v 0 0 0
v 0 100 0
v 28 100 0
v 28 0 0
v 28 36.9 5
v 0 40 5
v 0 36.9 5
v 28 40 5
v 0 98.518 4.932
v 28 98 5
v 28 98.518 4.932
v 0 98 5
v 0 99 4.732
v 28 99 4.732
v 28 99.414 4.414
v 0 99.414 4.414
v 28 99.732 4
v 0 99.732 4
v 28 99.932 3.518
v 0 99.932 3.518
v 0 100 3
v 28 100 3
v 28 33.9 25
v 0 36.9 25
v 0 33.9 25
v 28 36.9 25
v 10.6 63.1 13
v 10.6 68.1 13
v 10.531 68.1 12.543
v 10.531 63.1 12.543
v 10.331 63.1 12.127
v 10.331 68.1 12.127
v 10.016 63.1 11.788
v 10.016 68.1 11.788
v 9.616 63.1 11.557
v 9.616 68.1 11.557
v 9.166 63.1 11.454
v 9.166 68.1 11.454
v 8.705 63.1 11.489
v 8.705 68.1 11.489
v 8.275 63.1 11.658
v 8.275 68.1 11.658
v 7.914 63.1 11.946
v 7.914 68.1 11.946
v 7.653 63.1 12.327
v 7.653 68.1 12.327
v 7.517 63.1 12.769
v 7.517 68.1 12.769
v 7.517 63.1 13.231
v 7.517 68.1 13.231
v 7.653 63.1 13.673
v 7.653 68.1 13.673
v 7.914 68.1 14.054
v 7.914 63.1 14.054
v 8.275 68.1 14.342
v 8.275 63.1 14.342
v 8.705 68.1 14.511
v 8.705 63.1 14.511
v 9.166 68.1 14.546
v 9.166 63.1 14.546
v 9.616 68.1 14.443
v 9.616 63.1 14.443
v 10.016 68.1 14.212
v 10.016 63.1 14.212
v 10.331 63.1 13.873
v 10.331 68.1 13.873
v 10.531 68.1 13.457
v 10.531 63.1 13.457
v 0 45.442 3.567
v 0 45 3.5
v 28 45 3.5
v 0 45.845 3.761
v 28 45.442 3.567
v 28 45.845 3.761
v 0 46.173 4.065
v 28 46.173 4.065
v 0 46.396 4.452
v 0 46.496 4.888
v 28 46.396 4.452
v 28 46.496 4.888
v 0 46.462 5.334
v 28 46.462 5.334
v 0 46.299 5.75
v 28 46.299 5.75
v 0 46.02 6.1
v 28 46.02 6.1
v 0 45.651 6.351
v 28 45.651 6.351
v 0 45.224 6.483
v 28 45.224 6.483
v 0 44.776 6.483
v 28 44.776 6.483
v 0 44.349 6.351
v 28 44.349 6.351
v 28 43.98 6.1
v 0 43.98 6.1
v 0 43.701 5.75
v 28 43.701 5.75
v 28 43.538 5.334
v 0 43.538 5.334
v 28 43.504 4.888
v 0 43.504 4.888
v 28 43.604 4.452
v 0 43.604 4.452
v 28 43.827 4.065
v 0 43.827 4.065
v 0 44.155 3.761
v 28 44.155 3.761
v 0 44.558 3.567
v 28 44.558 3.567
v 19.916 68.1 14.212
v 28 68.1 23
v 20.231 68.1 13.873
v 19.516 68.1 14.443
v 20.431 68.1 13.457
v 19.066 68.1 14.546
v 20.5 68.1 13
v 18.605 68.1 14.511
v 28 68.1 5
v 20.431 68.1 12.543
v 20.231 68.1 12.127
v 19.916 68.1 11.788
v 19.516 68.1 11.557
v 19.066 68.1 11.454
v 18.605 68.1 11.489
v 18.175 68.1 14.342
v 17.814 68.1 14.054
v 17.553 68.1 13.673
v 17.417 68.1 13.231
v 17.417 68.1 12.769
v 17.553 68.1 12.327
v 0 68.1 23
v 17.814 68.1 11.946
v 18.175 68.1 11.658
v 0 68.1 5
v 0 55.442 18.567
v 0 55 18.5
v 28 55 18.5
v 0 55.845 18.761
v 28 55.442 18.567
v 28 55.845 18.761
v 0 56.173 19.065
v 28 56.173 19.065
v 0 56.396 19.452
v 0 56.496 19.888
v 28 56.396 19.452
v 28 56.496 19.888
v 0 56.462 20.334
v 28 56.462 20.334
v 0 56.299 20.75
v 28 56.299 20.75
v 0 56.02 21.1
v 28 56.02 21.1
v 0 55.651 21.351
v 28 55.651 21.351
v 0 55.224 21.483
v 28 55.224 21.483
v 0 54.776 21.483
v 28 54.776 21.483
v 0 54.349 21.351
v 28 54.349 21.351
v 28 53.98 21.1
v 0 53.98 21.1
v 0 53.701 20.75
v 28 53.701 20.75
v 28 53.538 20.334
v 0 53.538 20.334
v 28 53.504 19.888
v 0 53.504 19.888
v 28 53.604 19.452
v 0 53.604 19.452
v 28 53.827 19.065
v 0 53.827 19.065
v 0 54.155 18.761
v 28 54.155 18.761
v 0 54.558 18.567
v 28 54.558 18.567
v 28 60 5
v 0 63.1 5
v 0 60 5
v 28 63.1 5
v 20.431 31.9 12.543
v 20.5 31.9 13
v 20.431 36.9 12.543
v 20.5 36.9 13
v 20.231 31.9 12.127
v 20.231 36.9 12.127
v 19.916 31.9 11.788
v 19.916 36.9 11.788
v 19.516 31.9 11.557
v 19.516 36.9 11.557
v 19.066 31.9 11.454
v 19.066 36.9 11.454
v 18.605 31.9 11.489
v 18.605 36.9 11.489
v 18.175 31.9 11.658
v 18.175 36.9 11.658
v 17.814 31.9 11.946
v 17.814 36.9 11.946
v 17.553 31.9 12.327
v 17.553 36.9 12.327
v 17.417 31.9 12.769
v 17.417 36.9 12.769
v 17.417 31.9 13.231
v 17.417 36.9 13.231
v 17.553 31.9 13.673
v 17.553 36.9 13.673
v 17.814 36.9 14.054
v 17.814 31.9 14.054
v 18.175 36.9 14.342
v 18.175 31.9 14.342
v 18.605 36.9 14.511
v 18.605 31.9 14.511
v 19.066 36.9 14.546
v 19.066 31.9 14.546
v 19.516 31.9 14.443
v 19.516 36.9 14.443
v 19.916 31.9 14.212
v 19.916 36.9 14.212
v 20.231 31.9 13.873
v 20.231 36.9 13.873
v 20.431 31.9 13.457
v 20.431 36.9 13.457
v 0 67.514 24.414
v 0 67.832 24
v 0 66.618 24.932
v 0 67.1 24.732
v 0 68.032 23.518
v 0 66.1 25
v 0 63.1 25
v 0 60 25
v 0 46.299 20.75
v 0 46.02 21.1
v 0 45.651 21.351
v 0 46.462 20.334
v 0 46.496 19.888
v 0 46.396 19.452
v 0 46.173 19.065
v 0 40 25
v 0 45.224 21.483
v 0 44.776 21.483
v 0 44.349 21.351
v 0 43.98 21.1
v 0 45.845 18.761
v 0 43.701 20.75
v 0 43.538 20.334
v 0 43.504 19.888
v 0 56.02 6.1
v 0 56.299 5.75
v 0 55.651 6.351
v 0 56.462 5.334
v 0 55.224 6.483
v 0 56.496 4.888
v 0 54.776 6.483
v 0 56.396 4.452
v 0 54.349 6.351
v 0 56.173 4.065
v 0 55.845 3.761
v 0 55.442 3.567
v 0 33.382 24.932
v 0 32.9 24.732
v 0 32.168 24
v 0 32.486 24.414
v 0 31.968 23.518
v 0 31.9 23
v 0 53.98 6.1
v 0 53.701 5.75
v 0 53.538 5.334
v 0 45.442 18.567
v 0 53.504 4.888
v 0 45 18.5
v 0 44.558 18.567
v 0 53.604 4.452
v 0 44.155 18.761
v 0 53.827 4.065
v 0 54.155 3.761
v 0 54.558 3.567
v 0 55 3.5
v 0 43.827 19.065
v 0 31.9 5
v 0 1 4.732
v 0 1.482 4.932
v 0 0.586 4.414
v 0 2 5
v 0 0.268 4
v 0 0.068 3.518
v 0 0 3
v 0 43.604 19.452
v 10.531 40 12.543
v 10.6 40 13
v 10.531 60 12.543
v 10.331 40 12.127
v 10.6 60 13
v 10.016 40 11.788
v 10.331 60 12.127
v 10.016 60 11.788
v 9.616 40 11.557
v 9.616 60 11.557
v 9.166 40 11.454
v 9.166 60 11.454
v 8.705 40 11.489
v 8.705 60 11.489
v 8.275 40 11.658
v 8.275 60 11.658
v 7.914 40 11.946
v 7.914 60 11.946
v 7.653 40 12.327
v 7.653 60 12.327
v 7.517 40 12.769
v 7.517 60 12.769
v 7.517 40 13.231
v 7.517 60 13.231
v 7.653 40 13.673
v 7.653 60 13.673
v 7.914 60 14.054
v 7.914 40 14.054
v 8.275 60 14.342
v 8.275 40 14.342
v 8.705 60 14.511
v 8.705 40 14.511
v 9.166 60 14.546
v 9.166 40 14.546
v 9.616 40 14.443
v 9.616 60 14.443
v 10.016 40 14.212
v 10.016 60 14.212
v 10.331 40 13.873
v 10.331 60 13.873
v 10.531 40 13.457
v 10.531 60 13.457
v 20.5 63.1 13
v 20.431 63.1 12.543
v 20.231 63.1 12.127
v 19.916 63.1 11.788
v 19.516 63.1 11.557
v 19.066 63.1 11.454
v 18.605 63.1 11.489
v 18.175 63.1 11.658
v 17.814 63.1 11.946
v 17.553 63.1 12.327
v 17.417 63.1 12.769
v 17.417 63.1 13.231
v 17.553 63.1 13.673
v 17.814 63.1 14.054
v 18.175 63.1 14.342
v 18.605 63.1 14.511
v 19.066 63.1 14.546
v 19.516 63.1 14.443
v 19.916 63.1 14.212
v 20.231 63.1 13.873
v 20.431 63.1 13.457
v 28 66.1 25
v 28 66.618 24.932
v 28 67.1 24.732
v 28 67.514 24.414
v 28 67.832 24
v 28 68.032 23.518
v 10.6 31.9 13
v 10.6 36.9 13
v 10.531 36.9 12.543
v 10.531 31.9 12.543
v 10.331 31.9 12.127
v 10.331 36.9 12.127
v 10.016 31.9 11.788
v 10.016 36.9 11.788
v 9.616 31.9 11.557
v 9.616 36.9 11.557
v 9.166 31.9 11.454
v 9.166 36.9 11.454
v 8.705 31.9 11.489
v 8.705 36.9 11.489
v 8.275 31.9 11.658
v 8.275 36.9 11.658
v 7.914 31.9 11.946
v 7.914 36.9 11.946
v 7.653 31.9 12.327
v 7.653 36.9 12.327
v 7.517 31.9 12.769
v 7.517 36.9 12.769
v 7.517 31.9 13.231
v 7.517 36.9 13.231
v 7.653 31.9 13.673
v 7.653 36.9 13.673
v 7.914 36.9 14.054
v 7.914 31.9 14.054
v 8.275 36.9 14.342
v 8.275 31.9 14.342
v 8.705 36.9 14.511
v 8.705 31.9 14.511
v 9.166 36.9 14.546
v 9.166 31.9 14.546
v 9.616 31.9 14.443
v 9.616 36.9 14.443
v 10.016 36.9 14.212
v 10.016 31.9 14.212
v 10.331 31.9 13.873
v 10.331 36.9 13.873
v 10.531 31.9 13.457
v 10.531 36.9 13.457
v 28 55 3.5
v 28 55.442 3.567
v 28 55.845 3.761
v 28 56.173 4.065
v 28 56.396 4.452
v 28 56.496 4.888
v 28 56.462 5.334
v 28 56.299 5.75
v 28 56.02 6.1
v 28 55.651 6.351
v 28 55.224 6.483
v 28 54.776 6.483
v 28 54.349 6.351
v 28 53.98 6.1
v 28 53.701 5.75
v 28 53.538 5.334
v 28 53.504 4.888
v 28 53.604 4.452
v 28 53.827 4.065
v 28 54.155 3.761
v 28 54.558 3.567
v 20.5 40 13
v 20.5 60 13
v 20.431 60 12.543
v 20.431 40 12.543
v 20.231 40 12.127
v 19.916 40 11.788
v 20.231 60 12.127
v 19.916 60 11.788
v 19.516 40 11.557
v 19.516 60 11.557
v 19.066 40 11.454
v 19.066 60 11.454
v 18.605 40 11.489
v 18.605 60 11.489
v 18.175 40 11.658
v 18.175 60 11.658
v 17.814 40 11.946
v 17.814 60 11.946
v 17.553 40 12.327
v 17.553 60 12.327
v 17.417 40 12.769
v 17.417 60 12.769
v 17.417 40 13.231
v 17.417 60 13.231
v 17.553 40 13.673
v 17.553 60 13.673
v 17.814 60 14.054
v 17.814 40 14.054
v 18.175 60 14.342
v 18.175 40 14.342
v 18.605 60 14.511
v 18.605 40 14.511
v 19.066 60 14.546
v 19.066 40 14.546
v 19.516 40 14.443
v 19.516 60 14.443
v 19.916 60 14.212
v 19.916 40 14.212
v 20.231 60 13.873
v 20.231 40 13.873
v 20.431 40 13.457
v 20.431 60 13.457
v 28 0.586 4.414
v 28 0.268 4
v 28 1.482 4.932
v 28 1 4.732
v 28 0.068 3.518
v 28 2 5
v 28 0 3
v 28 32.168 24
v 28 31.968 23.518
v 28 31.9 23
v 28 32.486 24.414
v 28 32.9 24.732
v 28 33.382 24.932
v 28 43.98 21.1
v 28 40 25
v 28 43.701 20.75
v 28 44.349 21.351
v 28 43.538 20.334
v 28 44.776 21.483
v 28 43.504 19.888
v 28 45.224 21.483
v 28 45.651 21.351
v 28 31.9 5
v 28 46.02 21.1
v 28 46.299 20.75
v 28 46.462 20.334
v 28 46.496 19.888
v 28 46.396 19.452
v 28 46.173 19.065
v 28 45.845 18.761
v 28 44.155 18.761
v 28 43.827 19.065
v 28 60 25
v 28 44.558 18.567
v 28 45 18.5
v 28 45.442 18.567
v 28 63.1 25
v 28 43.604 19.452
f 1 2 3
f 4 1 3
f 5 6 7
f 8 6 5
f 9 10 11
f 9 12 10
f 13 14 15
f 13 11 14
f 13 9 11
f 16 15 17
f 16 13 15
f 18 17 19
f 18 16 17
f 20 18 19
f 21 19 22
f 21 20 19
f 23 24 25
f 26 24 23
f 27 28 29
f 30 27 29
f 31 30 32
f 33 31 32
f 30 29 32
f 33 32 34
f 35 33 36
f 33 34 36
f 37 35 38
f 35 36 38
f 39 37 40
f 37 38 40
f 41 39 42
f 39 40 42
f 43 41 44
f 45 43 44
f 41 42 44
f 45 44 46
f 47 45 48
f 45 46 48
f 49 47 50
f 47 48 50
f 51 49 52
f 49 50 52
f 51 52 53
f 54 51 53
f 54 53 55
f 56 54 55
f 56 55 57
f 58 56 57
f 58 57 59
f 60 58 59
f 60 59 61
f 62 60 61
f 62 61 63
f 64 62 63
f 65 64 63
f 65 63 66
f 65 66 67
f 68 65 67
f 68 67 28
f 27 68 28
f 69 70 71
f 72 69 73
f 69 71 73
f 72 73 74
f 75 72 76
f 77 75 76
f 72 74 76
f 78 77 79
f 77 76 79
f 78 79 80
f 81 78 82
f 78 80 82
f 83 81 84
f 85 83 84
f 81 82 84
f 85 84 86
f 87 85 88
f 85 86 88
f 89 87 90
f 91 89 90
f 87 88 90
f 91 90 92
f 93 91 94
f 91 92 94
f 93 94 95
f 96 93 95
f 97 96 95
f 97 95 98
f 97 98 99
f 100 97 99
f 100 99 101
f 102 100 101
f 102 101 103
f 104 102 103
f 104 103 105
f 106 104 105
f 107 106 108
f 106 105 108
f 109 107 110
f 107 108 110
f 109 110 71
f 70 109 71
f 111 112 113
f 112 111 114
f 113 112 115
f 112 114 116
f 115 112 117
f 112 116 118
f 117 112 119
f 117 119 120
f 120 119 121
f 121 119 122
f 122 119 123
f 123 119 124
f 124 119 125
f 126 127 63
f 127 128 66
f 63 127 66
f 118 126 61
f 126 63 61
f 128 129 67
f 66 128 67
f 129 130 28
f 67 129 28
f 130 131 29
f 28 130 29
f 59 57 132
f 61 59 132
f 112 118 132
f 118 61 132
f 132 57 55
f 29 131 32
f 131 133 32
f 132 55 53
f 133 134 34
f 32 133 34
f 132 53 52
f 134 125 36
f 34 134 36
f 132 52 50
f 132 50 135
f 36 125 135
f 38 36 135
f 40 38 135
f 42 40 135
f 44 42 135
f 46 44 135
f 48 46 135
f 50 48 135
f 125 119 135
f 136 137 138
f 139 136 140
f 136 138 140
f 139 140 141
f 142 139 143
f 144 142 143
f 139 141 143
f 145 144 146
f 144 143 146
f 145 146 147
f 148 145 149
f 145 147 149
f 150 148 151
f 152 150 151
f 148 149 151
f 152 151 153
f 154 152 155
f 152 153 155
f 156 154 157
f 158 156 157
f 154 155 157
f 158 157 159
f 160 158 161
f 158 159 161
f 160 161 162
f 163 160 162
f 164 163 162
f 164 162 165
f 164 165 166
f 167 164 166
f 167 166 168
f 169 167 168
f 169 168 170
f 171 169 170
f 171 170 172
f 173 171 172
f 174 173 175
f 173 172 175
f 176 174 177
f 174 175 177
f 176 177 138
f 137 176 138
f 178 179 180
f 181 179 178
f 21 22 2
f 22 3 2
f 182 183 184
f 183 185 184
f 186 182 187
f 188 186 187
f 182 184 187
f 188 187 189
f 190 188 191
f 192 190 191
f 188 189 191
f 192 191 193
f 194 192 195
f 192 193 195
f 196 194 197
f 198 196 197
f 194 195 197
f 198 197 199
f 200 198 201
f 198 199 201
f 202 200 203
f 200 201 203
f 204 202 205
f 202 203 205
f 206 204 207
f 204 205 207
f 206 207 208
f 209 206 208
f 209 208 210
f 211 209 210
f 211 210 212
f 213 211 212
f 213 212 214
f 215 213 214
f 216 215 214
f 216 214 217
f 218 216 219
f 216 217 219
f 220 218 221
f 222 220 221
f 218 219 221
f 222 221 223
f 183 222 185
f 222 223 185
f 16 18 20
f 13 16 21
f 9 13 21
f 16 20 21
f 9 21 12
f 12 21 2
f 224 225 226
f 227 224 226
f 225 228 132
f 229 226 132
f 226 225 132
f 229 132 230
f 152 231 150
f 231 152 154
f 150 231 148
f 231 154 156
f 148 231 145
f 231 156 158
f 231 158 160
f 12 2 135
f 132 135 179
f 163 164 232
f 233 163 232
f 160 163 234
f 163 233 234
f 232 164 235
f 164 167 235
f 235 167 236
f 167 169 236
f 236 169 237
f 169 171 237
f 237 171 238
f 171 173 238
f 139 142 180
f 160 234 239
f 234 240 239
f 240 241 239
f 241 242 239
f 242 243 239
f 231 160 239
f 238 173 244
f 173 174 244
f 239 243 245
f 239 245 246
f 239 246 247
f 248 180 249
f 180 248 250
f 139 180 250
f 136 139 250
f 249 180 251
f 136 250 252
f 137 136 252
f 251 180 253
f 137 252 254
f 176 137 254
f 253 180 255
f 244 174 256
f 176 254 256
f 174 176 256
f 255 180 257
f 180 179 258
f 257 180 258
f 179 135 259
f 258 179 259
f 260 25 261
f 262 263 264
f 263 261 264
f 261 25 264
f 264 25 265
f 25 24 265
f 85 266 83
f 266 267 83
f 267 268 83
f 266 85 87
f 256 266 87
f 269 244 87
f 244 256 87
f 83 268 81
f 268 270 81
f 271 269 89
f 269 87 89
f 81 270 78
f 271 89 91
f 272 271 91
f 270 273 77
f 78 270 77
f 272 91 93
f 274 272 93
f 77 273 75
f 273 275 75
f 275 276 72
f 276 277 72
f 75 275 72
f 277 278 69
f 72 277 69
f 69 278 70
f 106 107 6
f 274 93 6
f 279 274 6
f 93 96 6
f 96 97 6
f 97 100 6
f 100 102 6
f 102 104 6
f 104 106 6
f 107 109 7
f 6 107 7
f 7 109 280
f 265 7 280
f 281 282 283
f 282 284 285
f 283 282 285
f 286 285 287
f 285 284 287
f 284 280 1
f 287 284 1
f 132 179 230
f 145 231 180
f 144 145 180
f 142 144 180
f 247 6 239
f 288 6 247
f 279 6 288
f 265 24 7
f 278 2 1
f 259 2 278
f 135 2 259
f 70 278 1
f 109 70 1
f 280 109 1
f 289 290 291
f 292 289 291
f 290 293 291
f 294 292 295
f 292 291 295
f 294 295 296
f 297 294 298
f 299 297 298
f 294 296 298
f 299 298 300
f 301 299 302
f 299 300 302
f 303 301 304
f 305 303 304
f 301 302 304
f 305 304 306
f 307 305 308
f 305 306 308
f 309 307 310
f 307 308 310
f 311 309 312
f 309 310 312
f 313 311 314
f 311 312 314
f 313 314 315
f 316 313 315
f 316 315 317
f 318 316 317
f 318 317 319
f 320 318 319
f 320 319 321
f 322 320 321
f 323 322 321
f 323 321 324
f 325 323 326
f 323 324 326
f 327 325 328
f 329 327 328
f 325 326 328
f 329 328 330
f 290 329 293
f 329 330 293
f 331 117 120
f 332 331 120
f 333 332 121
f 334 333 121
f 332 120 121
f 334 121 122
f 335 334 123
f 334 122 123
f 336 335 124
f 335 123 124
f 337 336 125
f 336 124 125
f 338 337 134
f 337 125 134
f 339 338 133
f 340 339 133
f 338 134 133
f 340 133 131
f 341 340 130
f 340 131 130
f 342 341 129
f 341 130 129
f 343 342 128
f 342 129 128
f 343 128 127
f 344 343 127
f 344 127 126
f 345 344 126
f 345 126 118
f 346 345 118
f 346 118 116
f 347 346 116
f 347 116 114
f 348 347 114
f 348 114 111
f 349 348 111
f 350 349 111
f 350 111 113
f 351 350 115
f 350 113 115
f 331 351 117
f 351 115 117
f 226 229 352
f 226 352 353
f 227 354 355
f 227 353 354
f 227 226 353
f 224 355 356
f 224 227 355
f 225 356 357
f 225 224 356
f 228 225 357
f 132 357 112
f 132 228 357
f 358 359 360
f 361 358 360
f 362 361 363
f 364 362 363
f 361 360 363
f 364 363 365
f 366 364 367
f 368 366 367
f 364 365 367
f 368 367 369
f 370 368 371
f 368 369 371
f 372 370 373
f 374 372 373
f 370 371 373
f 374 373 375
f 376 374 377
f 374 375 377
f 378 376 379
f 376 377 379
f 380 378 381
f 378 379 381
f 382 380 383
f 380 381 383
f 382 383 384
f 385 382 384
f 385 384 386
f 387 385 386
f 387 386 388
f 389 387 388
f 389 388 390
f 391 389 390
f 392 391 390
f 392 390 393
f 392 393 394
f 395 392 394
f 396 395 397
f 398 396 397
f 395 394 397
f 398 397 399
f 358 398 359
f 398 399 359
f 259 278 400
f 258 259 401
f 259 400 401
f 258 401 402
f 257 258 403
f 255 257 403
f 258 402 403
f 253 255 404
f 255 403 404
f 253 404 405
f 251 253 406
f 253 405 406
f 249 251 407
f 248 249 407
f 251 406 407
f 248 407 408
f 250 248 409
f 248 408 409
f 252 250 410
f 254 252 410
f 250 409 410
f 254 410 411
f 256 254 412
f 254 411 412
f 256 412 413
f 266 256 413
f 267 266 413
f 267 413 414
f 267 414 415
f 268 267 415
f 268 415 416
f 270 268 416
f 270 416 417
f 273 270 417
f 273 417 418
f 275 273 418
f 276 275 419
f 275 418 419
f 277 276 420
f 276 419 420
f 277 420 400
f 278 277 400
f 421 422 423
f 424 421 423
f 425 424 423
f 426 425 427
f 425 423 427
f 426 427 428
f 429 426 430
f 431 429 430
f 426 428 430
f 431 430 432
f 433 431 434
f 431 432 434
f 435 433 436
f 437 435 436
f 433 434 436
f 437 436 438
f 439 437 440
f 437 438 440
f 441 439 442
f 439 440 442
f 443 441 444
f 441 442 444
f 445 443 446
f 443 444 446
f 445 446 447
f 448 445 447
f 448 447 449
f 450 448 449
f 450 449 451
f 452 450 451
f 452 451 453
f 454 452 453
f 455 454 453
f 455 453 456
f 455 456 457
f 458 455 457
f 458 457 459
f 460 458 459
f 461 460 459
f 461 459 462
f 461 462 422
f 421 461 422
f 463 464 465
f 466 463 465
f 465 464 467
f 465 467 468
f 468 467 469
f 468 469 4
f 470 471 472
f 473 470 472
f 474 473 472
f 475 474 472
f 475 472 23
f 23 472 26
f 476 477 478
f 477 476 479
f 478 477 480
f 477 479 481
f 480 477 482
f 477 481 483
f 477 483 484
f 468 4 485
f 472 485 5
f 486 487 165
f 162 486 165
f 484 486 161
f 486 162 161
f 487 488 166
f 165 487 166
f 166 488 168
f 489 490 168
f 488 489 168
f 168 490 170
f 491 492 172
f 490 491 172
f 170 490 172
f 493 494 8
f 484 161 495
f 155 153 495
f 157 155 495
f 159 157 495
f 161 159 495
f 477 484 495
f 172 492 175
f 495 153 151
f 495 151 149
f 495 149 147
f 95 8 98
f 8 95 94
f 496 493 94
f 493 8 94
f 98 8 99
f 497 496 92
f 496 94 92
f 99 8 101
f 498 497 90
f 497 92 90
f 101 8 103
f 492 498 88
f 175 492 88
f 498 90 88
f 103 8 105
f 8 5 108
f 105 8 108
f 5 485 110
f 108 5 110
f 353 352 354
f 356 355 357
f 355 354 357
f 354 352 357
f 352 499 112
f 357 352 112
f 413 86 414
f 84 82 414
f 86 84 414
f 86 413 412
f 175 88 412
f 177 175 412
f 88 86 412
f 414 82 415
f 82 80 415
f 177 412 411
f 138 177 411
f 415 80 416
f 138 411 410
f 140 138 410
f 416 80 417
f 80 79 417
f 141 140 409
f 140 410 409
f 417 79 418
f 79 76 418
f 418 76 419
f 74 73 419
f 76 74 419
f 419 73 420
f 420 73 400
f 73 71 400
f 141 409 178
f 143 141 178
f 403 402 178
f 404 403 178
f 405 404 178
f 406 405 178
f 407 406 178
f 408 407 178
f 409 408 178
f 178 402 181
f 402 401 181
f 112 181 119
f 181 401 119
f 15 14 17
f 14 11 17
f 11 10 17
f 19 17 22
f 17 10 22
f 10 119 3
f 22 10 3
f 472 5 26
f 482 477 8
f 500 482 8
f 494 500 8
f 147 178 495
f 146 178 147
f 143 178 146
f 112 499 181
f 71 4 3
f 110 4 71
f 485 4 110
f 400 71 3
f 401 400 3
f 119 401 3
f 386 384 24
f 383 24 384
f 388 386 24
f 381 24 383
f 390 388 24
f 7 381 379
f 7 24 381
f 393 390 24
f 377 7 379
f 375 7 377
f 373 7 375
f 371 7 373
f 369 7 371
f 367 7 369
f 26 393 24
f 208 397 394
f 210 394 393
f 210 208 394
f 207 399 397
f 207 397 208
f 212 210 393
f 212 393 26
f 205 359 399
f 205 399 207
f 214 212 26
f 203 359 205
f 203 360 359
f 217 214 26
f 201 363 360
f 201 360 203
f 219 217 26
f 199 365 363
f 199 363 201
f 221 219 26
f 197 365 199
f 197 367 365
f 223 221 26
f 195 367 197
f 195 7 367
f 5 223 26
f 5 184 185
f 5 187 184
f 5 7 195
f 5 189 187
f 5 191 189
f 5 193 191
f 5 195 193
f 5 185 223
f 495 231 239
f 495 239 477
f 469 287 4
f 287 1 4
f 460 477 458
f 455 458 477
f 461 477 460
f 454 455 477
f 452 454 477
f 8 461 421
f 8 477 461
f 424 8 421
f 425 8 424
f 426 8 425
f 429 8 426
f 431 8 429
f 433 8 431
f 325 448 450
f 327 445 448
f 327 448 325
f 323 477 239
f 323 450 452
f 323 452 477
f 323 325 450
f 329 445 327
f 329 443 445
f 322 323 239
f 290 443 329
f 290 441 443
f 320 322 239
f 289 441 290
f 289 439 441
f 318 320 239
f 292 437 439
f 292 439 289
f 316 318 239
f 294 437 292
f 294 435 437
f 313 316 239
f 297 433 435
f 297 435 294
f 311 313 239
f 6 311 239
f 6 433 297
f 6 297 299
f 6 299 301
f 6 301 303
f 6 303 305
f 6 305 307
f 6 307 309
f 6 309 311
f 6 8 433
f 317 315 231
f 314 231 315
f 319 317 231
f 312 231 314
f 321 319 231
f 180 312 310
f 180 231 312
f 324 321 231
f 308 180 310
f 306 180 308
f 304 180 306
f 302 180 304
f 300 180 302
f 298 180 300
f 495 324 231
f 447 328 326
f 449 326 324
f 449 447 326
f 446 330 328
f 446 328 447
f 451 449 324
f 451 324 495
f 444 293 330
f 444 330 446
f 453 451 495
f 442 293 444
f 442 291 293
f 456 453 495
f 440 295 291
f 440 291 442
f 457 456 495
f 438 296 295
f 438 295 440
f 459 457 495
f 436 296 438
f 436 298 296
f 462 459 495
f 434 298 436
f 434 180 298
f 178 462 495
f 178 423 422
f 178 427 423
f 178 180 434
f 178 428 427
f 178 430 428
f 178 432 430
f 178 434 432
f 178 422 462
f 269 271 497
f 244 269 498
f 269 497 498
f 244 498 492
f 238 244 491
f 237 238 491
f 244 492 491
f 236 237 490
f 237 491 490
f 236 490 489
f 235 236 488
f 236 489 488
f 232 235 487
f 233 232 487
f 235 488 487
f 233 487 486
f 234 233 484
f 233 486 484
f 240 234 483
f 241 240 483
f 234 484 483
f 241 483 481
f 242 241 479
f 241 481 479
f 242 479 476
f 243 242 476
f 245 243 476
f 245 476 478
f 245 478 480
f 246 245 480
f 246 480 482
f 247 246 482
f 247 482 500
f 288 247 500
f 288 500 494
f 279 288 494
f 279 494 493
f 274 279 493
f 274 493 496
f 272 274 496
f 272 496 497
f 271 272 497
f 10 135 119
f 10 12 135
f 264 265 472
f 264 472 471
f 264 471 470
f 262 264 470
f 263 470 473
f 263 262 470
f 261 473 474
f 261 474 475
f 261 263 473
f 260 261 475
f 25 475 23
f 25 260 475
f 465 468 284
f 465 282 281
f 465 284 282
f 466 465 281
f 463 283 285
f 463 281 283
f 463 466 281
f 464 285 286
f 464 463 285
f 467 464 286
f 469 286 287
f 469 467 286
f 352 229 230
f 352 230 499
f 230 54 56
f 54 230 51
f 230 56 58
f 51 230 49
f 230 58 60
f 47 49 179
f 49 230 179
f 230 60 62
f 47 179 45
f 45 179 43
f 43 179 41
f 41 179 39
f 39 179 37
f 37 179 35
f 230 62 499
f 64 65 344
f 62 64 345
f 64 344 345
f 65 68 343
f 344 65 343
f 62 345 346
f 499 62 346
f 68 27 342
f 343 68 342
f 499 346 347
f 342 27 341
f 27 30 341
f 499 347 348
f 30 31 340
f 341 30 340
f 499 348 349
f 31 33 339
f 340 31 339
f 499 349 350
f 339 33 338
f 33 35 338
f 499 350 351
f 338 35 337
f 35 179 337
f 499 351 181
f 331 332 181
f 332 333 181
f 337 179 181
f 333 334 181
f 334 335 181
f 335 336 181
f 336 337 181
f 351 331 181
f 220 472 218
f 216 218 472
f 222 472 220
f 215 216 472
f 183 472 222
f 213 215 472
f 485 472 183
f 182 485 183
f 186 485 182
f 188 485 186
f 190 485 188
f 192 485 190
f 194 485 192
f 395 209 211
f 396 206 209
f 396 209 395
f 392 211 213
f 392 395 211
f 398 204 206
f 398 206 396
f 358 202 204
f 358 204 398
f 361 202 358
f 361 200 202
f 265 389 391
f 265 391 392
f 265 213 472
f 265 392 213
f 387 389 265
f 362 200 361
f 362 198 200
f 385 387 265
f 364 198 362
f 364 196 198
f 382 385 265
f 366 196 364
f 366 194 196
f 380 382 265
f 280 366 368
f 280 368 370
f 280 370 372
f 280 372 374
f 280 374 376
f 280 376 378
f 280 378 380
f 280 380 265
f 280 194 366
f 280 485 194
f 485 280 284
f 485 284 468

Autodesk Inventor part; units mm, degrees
ref_plane "YZ Plane" through (0, 0, 0) normal (1, 0, 0) x (0, 1, 0)
ref_plane "XZ Plane" through (0, 0, 0) normal (0, 1, 0) x (-1, 0, 0)
ref_plane "XY Plane" through (0, 0, 0) normal (0, 0, 1) x (1, 0, 0)
sketch "Sketch1" plane through (0, 0, 0) normal (0, 0, 1) x (1, 0, 0)
  line L0 (0, 0) -> (28, 0)
  line L1 (28, 0) -> (28, 100)
  line L2 (28, 100) -> (0, 100)
  line L3 (0, 100) -> (0, 0)
  dimension "d0" = 28
  dimension "d1" = 100
extrude "Extrusion1" add sketch "Sketch1" along normal blind 5
sketch "Sketch3" plane through (0, 0, 5) normal (0, 0, 1) x (1, 0, 0)
  line L0 (28, 0) -> (28, 100) projected
  line L1 (28, 100) -> (0, 100) projected
  line L2 (0, 100) -> (0, 0) projected
  line L3 (0, 0) -> (28, 0) projected
  line L4 (0, 50) -> (28, 50) construction
  line L5 (28, 0) -> (28, 100) construction
  line L6 (0, 100) -> (0, 0) projected
  line L7 (0, 60) -> (28, 60)
  line L8 (28, 60) -> (28, 40)
  line L9 (28, 40) -> (0, 40)
  line L10 (0, 40) -> (0, 60)
  line L11 (0, 63.1) -> (28, 63.1)
  line L12 (28, 63.1) -> (28, 68.1)
  line L13 (28, 68.1) -> (0, 68.1)
  line L14 (0, 68.1) -> (0, 63.1)
  line L15 (0, 36.9) -> (28, 36.9)
  line L16 (28, 36.9) -> (28, 31.9)
  line L17 (28, 31.9) -> (0, 31.9)
  line L18 (0, 31.9) -> (0, 36.9)
  point P0 (0, 31.9)
  point P1 (28, 36.9)
  point P2 (0, 40)
  point P3 (0, 68.1)
  point P4 (28, 63.1)
  dimension "d6" = 50
  dimension "d7" = 100
  dimension "d8" = 10
  dimension "d9" = 10
  dimension "d10" = 5
  dimension "d11" = 3.1
  dimension "d12" = 3.1
  dimension "d13" = 5
extrude "Extrusion2" add sketch "Sketch3" along normal blind 20 contours L17 L2 L15 L0 | L9 L2 L7 L0 | L11 L2 L13 L0
sketch "Sketch4" plane through (0, 68.1, 5) normal (0, 1, 0) x (1, 0, 0)
  line L0 (0, 0) -> (28, 0) projected
  line L1 (0, 0) -> (0, -20) projected
  line L2 (28, -20) -> (0, -20) projected
  line L3 (28, 0) -> (28, -20) projected
  circle A0 centre (9.05, -8) radius 1.55
  circle A1 centre (18.95, -8) radius 1.55
  line L4 (0, -20) -> (28, -20) construction
  line L5 (14, -20) -> (14, 0) construction
  point P0 (0, 5)
  dimension "d16" = 3.1
  dimension "d17" = 3.1
  dimension "d18" = 4.95
  dimension "d19" = 4.95
  dimension "d20" = 8
  dimension "d21" = 8
extrude "Extrusion3" cut sketch "Sketch4" against normal blind 100 contours A0 | A1
ref_plane "Work Plane1" through (14, 0, 0) normal (1, 0, 0) x (0, 0, -1)
sketch "Sketch13" plane through (28, 0, 0) normal (1, 0, 0) x (0, 0, -1)
  circle A0 centre (-5, 55) radius 1.5
  circle A1 centre (-5, 45) radius 1.5
  circle A2 centre (-20, 55) radius 1.5
  circle A3 centre (-20, 45) radius 1.5
  line L0 (-5, 60) -> (-25, 60) projected
  line L1 (-5, 40) -> (-25, 40) projected
  line L2 (-25, 40) -> (-25, 60) projected
  line L3 (0, 0) -> (0, 100) projected
  dimension "d57" = 3
  dimension "d58" = 3
  dimension "d59" = 3
  dimension "d60" = 3
  dimension "d61" = 5
  dimension "d62" = 5
  dimension "d63" = 5
  dimension "d64" = 5
  dimension "d65" = 5
  dimension "d67" = 5
  dimension "d69" = 5
  dimension "d70" = 5
extrude "Extrusion11" cut sketch "Sketch13" against normal blind 180
fillet "Fillet1" radius 2 4 edges at (14, 100, 5) (14, 0, 5) (14, 68.1, 25) (14, 31.9, 25)
ref_plane "Work Plane3" through (0, 50, 5) normal (0, 1, 0) x (1, 0, 0)
equation "\"d6\" = 0.5 * d7"
equation "\"d62\" = d61"
equation "\"d63\" = d61"
equation "\"d64\" = d61"
equation "\"d67\" = d65"
equation "\"d69\" = d65"
equation "\"d70\" = d65"
properties part number "Foam_wing_mount"
